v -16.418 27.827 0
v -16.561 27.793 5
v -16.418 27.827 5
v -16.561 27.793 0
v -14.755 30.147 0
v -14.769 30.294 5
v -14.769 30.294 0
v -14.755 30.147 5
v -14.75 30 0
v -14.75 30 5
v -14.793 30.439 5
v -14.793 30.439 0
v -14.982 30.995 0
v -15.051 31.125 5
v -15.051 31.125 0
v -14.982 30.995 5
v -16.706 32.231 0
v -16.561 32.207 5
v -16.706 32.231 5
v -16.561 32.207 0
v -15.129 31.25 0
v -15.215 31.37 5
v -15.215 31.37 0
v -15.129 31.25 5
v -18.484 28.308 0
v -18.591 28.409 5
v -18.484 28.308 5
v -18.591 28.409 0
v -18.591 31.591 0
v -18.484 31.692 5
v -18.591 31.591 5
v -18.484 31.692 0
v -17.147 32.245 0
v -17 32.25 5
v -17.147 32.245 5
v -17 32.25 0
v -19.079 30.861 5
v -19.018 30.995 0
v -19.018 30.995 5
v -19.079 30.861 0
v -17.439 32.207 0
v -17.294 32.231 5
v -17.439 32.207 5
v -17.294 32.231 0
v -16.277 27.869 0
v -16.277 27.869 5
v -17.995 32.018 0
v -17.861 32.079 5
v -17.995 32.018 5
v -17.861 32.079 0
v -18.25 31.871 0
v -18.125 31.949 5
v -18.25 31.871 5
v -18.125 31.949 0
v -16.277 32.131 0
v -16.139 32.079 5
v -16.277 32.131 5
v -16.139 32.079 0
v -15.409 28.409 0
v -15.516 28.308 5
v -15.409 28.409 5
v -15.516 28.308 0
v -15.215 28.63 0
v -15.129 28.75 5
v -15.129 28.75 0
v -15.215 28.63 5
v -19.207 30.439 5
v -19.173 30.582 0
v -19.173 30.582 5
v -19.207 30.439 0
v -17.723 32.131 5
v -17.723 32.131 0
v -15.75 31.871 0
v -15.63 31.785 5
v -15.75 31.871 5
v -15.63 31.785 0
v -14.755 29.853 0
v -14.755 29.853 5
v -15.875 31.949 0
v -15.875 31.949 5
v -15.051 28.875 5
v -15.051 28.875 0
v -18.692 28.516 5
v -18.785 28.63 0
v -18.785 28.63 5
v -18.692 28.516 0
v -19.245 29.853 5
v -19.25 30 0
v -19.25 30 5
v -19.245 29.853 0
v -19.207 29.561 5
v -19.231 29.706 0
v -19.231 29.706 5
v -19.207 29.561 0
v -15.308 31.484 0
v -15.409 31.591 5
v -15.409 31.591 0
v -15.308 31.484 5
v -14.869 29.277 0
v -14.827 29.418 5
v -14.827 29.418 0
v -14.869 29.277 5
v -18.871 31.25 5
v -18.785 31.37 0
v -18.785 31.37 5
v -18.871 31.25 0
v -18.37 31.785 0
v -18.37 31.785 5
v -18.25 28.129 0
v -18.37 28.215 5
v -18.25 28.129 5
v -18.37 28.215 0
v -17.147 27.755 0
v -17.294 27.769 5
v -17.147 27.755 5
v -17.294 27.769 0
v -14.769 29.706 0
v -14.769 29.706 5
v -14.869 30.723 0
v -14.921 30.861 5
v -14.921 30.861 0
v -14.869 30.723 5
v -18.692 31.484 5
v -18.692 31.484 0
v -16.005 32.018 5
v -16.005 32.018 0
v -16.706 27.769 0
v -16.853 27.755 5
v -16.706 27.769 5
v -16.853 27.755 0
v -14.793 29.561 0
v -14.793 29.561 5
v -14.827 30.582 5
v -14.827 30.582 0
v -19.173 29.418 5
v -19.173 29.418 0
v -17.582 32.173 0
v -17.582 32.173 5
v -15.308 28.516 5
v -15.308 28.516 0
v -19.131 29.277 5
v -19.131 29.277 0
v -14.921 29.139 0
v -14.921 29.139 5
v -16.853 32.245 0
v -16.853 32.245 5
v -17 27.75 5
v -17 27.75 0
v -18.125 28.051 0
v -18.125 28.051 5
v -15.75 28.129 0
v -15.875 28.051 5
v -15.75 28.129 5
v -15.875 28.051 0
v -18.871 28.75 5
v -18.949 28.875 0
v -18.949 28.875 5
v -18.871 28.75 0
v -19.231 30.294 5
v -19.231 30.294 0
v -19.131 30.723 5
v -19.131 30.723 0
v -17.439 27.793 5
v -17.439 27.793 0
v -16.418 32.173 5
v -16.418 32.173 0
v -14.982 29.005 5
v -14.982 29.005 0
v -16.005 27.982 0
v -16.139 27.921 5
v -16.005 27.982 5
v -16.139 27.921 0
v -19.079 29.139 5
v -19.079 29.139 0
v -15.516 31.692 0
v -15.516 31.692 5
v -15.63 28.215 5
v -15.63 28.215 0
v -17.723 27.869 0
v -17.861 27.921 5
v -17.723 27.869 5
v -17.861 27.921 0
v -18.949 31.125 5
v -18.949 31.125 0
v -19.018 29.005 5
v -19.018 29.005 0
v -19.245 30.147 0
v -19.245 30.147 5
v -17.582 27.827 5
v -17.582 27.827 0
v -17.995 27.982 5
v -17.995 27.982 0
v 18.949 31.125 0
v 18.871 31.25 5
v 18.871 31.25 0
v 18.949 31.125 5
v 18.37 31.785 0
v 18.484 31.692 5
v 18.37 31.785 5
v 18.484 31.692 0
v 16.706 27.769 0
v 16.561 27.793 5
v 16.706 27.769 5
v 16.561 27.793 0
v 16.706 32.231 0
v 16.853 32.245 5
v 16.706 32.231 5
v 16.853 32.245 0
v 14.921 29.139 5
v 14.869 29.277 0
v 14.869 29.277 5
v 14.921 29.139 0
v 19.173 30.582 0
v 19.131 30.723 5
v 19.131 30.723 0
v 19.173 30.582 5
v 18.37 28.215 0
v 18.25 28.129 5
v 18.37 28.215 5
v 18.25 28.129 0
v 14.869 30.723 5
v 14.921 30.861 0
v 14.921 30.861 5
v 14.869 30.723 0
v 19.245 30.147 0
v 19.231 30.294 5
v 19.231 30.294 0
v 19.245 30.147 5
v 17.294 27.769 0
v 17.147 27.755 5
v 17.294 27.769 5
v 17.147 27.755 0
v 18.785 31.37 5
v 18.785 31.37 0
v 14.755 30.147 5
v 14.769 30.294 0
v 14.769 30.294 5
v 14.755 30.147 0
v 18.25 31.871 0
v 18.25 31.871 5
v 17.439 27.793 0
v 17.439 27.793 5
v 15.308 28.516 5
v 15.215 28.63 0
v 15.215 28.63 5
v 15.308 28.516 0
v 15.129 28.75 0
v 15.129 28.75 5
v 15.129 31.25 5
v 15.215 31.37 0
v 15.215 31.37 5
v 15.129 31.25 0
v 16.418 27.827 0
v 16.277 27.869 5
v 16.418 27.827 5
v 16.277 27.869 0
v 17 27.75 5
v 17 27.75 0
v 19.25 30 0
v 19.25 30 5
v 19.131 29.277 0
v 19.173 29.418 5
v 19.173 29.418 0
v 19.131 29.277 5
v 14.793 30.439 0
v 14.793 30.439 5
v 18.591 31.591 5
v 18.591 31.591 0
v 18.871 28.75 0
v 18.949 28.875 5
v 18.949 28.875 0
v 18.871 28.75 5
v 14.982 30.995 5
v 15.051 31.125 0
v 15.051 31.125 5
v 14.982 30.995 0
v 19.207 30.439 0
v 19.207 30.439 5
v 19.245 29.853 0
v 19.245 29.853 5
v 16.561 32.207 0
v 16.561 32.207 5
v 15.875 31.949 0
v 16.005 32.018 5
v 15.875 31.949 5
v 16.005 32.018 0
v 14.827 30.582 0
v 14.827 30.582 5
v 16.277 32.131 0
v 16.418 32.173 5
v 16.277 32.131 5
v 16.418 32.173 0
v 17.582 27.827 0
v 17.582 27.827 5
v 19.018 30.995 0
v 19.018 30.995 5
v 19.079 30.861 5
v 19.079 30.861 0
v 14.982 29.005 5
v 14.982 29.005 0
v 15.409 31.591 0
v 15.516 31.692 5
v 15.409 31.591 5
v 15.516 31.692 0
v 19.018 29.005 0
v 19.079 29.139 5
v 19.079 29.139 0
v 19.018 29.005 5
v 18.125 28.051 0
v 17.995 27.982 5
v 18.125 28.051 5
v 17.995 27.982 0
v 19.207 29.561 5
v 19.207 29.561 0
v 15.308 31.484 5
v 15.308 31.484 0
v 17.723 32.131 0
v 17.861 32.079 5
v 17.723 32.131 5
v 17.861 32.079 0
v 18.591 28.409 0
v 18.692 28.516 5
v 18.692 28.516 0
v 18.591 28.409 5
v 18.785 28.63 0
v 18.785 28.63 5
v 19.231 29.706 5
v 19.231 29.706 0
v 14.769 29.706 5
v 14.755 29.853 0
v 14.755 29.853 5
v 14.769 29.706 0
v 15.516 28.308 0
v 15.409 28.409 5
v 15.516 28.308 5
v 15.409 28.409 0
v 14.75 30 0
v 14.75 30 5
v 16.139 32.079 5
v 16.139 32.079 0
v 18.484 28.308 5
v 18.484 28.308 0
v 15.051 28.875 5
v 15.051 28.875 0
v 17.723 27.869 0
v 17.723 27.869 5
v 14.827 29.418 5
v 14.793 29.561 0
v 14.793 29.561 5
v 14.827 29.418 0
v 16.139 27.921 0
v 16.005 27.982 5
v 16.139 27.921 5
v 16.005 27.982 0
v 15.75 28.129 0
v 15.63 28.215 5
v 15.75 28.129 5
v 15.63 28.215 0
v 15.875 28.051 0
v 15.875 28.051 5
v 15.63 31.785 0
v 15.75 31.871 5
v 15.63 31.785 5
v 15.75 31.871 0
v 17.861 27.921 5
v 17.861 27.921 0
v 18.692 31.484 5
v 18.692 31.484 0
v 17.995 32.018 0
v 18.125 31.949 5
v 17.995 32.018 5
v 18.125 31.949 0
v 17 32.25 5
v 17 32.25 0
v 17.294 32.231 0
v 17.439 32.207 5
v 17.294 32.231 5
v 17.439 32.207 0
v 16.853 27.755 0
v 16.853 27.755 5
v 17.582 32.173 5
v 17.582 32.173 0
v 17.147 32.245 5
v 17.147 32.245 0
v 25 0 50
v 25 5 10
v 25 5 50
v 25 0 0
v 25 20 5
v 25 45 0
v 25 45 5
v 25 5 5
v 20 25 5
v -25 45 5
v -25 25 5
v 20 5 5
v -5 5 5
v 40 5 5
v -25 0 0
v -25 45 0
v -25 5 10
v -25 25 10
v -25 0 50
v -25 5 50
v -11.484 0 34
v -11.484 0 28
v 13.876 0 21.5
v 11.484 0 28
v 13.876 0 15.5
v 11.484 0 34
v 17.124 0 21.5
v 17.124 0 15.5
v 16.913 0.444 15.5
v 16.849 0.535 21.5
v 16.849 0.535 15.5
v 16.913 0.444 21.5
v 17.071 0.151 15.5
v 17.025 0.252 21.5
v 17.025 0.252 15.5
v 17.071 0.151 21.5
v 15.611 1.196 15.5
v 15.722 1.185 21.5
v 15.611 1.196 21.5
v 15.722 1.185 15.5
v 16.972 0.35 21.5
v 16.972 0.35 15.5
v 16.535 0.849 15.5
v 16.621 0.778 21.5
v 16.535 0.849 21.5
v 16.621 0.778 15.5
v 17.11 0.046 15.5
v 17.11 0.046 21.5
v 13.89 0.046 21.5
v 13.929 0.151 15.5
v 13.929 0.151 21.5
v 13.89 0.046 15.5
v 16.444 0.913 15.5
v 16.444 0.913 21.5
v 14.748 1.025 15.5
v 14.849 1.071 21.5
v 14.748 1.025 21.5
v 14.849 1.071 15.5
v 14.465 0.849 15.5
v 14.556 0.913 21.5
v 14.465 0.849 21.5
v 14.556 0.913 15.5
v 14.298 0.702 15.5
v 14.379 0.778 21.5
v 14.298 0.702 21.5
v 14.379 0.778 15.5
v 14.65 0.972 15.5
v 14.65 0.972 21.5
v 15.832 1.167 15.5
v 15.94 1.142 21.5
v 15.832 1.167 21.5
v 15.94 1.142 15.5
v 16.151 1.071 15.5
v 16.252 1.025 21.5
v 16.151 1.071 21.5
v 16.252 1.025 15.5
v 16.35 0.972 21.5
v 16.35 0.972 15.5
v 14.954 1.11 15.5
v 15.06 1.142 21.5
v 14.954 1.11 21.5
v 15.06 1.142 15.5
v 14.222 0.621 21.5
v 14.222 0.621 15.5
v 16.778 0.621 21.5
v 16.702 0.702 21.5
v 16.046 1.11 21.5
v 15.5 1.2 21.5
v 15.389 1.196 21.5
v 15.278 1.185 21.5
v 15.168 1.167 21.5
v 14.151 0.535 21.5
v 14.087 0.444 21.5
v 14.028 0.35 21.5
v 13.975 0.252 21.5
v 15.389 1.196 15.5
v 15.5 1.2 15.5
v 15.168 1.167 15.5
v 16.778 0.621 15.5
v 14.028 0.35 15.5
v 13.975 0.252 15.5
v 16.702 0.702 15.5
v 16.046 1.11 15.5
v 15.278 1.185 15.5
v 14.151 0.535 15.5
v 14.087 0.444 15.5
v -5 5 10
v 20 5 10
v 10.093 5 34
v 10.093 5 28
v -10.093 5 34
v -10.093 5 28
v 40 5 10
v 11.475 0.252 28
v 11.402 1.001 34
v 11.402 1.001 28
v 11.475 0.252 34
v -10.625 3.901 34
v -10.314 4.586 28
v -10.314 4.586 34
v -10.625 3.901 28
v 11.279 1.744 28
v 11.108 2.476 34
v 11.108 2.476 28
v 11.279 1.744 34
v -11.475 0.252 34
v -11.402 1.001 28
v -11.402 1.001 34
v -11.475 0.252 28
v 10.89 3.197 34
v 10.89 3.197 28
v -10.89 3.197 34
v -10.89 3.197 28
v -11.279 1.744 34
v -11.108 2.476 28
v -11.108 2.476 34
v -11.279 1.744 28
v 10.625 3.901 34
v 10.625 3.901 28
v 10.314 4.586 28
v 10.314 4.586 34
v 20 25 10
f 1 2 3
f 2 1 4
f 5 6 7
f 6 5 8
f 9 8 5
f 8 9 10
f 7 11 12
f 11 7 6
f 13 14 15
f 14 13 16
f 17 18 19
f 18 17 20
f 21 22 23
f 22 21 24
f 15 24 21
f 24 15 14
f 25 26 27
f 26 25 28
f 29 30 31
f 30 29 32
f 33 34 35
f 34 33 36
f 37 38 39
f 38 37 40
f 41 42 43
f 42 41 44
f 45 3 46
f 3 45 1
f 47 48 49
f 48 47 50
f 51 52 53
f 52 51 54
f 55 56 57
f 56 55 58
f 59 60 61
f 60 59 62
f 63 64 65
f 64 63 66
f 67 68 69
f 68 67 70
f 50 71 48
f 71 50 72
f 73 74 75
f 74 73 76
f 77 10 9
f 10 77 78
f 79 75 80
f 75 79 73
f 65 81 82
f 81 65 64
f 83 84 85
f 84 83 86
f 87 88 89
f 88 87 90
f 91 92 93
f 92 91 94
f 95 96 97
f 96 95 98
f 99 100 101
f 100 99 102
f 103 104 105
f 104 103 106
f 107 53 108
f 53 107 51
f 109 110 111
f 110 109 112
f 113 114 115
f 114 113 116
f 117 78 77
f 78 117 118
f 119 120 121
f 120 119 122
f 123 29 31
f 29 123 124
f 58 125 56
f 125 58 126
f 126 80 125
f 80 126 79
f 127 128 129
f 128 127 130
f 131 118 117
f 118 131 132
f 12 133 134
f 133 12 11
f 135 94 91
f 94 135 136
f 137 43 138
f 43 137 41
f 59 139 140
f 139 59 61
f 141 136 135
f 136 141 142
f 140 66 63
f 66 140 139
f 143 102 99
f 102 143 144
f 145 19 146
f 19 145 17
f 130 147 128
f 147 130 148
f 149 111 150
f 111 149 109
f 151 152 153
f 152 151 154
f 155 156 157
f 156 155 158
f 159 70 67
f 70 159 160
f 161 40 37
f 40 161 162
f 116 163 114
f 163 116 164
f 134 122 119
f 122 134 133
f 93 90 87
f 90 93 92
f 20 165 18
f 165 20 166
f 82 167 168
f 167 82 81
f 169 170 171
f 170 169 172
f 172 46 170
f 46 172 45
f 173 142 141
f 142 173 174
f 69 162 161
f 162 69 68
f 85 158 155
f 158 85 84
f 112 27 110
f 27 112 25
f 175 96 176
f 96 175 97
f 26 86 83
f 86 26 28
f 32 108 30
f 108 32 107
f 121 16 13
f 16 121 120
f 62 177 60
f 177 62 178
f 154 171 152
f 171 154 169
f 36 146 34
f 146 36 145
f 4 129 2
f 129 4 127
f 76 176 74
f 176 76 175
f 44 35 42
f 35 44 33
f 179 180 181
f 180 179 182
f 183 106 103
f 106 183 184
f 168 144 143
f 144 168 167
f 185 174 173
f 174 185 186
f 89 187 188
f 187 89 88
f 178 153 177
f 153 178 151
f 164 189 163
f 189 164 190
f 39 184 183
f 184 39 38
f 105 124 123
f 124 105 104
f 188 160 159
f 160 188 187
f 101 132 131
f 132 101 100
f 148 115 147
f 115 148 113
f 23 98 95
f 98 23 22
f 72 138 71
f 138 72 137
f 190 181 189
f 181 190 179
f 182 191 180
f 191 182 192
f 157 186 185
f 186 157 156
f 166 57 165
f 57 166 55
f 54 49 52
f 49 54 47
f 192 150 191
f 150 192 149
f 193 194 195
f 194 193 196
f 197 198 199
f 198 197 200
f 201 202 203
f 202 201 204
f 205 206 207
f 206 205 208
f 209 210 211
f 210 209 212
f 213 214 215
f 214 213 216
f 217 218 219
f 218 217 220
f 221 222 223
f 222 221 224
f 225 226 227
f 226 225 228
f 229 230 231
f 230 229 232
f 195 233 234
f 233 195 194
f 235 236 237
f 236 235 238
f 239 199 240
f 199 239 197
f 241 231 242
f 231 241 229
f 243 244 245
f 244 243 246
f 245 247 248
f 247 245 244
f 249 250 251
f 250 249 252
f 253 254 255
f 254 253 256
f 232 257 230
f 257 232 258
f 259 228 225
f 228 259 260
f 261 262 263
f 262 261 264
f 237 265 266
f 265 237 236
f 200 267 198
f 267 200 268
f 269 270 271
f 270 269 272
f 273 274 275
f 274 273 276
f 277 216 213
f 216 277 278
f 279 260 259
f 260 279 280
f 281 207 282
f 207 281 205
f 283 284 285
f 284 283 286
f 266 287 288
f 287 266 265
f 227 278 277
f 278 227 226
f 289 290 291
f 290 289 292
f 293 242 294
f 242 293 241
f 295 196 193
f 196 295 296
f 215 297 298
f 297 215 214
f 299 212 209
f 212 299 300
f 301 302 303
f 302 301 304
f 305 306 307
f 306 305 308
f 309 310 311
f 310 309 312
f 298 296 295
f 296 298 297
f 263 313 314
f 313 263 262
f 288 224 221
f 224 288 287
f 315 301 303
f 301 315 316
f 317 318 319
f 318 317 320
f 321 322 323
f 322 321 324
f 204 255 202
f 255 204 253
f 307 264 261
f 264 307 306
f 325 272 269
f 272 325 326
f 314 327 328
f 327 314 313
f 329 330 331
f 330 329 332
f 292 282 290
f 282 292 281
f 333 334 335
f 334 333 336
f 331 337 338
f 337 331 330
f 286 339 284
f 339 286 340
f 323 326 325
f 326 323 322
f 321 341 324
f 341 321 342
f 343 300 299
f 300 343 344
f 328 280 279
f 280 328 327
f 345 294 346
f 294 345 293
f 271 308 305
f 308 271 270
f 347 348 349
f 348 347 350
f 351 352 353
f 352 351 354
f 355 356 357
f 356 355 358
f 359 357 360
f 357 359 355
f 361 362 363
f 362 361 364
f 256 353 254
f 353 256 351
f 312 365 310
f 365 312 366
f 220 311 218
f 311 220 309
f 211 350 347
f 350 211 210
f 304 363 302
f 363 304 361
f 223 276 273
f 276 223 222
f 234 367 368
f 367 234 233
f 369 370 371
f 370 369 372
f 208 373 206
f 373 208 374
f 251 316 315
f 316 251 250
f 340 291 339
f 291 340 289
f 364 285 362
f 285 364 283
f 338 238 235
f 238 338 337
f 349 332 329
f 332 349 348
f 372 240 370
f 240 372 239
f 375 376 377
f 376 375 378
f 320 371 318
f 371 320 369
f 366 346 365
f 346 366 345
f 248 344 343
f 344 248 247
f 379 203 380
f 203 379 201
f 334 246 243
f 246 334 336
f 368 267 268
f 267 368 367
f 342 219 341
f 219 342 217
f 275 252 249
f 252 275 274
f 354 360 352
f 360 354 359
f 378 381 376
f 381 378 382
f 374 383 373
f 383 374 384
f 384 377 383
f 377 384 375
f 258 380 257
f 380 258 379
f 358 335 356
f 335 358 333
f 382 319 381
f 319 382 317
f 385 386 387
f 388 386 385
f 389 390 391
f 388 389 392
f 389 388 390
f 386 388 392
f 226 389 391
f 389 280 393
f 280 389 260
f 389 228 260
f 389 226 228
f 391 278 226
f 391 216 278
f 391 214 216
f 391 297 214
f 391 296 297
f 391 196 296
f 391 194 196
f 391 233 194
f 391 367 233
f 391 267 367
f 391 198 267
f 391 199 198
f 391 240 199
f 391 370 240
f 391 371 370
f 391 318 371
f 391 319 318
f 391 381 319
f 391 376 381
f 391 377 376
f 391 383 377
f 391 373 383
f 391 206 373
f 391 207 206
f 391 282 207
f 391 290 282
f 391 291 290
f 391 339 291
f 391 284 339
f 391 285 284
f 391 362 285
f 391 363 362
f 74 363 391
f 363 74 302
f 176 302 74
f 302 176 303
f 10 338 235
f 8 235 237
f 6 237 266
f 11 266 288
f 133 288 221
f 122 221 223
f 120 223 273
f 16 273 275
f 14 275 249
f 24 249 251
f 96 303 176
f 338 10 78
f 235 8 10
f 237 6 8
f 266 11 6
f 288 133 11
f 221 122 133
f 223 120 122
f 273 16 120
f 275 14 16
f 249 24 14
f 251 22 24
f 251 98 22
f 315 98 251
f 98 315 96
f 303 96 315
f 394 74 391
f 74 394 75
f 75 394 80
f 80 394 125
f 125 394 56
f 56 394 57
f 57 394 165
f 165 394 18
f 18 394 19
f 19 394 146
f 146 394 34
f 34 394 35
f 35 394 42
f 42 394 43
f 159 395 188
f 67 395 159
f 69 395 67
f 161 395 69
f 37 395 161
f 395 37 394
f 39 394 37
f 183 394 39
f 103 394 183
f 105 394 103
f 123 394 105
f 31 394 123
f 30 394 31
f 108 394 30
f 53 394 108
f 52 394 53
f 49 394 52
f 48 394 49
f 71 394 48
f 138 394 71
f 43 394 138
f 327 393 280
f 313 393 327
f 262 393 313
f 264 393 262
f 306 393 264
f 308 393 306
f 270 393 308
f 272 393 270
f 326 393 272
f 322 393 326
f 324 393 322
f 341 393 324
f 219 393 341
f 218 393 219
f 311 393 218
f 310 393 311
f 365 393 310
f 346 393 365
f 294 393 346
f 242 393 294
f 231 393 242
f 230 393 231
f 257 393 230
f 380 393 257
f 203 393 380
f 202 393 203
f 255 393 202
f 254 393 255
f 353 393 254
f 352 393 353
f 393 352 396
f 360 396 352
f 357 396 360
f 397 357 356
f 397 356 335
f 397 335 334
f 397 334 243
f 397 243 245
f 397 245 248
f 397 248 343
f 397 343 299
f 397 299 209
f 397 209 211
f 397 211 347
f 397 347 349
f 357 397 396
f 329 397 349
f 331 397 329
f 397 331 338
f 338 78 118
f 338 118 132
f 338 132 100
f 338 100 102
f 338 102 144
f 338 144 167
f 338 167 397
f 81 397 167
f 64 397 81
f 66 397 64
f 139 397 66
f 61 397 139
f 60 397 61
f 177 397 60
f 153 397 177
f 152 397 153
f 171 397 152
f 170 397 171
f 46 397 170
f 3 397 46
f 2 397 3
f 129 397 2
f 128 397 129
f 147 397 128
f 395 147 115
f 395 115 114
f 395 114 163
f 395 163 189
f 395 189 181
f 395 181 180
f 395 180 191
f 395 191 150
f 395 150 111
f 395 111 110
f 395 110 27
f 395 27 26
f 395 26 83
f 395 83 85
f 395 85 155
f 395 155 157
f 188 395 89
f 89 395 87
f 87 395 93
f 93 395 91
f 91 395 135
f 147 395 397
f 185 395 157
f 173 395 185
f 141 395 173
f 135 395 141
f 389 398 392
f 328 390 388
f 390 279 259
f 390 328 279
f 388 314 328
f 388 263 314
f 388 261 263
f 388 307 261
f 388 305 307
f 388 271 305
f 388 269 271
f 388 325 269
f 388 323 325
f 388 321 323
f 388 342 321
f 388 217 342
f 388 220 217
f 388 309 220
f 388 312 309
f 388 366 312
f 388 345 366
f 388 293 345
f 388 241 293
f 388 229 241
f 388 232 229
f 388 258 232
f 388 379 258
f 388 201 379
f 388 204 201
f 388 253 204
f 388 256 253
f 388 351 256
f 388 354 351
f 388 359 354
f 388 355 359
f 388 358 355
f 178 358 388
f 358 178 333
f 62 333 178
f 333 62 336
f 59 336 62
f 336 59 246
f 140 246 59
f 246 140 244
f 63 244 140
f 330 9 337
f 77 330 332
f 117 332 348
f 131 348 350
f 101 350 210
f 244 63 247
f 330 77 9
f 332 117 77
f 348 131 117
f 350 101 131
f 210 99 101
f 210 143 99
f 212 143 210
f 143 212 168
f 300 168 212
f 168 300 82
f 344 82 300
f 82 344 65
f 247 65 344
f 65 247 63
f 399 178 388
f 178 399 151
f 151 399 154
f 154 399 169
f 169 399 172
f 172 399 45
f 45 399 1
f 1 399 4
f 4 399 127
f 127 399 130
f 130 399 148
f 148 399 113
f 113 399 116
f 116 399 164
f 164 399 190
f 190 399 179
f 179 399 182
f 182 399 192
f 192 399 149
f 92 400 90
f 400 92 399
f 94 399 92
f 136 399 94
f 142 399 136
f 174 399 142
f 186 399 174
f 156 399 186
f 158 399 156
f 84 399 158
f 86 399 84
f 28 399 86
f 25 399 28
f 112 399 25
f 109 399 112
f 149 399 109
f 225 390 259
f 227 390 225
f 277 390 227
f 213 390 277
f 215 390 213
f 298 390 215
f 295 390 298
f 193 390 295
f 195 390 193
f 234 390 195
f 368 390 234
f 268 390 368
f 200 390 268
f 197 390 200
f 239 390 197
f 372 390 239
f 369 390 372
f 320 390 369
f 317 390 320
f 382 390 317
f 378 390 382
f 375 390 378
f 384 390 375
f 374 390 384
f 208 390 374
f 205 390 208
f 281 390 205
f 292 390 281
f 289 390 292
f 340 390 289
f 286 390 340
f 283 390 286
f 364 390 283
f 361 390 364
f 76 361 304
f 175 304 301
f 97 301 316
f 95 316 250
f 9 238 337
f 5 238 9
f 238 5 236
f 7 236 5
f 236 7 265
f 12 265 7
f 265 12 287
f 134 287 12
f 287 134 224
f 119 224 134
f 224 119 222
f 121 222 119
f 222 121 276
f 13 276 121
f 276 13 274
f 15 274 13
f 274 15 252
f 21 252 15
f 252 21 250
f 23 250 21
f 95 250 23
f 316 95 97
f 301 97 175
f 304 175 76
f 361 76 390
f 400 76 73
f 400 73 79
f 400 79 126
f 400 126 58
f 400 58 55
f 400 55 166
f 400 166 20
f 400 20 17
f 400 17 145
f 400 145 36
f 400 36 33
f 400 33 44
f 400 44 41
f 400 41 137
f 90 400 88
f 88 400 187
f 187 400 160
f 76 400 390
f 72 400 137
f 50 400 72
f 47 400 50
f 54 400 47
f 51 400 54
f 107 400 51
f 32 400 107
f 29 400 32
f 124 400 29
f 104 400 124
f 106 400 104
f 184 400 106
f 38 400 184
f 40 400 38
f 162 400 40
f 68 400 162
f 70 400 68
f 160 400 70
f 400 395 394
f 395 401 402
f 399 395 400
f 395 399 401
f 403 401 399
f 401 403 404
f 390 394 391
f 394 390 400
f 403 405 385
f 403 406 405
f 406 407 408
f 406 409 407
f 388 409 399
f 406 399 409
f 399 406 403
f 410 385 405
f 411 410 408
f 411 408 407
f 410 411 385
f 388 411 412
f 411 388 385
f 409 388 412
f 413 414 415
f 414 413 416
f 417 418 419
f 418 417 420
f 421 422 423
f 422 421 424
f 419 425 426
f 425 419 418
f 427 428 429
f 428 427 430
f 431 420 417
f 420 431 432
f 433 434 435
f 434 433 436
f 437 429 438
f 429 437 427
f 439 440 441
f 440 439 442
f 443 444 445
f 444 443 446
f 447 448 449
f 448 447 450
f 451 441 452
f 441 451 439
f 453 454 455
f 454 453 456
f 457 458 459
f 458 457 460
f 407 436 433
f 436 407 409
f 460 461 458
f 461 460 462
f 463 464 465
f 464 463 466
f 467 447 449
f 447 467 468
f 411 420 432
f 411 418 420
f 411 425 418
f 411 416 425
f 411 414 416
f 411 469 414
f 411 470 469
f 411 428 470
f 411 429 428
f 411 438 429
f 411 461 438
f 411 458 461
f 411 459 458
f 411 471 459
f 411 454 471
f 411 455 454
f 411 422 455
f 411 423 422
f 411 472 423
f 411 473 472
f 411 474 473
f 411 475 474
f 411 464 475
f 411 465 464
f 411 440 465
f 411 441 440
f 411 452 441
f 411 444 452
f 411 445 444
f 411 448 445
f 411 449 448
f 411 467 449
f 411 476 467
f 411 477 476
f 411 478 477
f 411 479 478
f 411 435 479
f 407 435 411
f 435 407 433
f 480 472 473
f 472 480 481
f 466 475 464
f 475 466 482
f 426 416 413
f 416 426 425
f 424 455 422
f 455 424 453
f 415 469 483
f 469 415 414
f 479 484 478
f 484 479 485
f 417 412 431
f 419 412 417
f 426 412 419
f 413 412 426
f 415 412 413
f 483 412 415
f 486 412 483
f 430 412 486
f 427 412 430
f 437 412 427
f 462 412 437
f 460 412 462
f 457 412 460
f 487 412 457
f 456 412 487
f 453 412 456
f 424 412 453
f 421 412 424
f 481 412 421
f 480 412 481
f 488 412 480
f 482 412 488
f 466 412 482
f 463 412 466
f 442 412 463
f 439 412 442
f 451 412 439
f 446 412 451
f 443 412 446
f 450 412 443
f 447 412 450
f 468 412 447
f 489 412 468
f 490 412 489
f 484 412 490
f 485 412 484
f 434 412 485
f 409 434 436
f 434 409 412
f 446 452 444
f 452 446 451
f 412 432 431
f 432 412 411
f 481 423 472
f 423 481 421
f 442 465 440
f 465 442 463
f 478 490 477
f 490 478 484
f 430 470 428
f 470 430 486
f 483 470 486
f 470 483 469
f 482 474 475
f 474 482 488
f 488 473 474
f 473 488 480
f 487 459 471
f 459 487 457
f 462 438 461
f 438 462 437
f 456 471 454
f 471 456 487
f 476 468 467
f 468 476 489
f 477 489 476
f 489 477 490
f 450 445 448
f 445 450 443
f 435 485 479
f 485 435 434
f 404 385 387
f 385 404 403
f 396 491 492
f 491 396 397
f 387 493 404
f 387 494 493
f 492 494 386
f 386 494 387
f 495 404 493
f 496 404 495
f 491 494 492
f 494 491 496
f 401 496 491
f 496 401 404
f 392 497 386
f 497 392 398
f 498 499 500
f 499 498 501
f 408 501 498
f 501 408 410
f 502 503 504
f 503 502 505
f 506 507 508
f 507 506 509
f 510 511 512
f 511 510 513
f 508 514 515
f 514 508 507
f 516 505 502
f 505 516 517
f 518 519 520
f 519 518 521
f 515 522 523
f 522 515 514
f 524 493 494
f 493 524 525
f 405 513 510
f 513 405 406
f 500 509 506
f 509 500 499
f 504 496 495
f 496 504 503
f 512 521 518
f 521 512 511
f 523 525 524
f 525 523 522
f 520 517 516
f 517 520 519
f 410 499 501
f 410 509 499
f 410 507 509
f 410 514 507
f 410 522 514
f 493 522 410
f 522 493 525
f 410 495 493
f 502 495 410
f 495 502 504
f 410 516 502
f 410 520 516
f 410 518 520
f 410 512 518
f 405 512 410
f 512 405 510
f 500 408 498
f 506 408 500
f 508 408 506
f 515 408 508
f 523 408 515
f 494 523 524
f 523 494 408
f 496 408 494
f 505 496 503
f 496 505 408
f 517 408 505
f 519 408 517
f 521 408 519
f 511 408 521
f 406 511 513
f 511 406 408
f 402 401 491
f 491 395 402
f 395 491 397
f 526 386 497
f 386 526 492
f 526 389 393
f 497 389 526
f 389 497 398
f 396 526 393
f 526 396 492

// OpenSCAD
// L-shaped mounting bracket for NEMA 17 stepper motor (syringe pump)
// Print orientation: base plate on bed, vertical plate builds upward

// ---------- Parameters ----------
base_x0      = -25;   // base plate X start
base_x1      = 25;    // base plate X end
base_y0      = 0;     // base plate Y start
base_y1      = 45;    // base plate Y end
base_z0      = 0;     // base plate Z start
base_z1      = 5;     // base plate Z end

hole_x       = -17;   // M4 hole X (left)
hole_y       = 30;    // M4 hole Y
hole_x2      = 17;    // M4 hole X (right)

motor_x0     = -25;   // motor plate X start
motor_x1     = 25;    // motor plate X end
motor_y0     = 0;     // motor plate Y start
motor_y1     = 5;     // motor plate Y end
motor_z0     = 0;     // motor plate Z start
motor_z1     = 50;    // motor plate Z end

boss_d       = 23;    // boss hole diameter
boss_x       = 0;     // boss hole X centre
boss_z       = 28;    // boss hole Z centre

screw_d      = 3.4;   // M3 screw hole diameter
screw_pitch  = 31;    // screw pattern side length

gusset_t     = 5;     // gusset thickness
gusset_leg   = 20;    // gusset leg length (Y and Z)

eps          = 0.5;   // cutter overshoot

$fn = 96;

// ---------- Model ----------
union() {
    // Base plate with M4 holes
    difference() {
        translate([base_x0, base_y0, base_z0])
            cube([base_x1 - base_x0, base_y1 - base_y0, base_z1 - base_z0]);

        for (x = [hole_x, hole_x2])
            translate([x, hole_y, -eps])
                cylinder(d = 4.5, h = base_z1 - base_z0 + 2 * eps);
    }

    // Motor plate with boss hole and M3 screws
    difference() {
        translate([motor_x0, motor_y0, motor_z0])
            cube([motor_x1 - motor_x0, motor_y1 - motor_y0, motor_z1 - motor_z0]);

        translate([boss_x, -eps, boss_z])
            cylinder(d = boss_d, h = motor_y1 - motor_y0 + 2 * eps);

        for (i = [0 : 3]) {
            a = screw_pitch / 2 * (i % 2 == 0 ? 1 : -1);
            b = screw_pitch / 2 * (i / 2 == 0 || i % 2 == 0 ? 1 : -1);
            translate([b, -eps, a])
                cylinder(d = screw_d, h = motor_y1 - motor_y0 + 2 * eps);
        }
    }

    // Gussets (right-angle corner at y = 5, z = 5)
    for (sx = [-1, 1])
        translate([sx > 0 ? 20 : -25, 5, 5])
            linear_extrude(height = gusset_t)
                polygon(points = [
                    [0, 0],
                    [gusset_leg, 0],
                    [0, gusset_leg]
                ]);
}
